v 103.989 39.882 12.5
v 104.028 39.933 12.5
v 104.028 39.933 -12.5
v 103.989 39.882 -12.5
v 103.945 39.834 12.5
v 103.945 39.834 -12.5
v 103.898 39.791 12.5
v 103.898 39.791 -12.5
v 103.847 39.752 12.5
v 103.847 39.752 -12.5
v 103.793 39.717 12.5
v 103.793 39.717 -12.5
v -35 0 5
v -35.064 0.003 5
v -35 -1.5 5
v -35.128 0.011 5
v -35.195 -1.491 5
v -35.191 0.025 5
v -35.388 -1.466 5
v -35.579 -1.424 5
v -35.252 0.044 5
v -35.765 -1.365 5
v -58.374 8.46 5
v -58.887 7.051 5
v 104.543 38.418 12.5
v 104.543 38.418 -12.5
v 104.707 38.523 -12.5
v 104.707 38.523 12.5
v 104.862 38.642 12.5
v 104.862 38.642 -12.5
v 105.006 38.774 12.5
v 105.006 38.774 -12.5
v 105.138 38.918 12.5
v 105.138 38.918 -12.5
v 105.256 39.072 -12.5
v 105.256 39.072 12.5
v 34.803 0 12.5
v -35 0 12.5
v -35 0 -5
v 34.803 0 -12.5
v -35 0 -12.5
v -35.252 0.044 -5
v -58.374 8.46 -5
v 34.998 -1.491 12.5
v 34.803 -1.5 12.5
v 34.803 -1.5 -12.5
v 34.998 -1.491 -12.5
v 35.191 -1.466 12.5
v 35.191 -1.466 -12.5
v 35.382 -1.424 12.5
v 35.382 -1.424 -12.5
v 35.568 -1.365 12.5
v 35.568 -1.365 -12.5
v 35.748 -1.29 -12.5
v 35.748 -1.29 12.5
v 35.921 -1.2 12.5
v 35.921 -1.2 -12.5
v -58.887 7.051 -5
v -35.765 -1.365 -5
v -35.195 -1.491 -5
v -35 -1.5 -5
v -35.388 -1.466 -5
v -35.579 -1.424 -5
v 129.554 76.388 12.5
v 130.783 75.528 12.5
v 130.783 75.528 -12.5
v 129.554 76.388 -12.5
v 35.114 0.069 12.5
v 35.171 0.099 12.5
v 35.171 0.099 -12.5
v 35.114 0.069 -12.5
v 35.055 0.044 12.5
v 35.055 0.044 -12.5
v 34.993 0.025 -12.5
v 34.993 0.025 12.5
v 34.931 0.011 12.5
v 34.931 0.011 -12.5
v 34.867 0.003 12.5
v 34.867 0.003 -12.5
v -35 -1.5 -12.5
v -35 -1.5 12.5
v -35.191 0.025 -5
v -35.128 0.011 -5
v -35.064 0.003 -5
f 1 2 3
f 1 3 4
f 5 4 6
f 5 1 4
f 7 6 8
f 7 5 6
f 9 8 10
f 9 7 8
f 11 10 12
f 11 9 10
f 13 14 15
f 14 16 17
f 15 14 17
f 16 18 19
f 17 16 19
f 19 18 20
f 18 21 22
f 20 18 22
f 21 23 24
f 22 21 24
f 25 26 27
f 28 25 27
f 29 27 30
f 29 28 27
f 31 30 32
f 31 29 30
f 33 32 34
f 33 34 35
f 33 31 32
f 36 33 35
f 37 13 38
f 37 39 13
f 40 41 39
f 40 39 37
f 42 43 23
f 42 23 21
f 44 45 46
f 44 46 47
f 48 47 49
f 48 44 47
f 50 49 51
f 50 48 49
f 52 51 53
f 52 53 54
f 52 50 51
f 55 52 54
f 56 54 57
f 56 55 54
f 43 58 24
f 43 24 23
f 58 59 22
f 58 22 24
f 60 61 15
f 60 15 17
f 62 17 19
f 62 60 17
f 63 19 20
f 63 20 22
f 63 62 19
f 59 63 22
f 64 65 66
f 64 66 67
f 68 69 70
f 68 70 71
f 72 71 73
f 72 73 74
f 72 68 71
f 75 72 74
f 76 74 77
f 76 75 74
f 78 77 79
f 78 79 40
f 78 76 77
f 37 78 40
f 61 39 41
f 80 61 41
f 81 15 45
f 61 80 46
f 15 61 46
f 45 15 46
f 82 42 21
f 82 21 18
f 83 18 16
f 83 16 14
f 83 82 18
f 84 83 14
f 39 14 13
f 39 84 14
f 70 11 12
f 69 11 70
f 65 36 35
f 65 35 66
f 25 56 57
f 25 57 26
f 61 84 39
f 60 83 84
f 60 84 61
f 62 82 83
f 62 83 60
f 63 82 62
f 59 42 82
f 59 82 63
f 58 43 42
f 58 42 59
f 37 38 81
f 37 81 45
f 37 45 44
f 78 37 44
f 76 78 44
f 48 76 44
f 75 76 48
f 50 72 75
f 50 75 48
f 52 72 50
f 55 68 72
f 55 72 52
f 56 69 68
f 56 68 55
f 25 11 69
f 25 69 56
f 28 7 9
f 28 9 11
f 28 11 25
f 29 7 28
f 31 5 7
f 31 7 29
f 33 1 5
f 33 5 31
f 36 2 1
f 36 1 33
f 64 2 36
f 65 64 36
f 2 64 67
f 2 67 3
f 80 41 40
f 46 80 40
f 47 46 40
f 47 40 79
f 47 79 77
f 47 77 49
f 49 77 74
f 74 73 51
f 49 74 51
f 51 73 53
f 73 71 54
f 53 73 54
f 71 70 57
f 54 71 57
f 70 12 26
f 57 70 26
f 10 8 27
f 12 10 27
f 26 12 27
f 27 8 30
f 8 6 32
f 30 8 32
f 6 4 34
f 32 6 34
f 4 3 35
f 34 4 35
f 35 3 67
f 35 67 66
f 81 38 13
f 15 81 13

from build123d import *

# Parameters (mm, degrees)
SKETCH1_W                    = 70
SKETCH1_H                    = 25
BASE_FLANGE1_DEPTH           = 1.5
EDGE_FLANGE1_DEPTH           = 10
EDGE_FLANGE2_STRIP_CUT_DEPTH = 25
EDGE_FLANGE2_DEPTH           = 25
EDGE_FLANGE3_STRIP_CUT_DEPTH = 25
EDGE_FLANGE3_DEPTH           = 25


# Sheet-metal steps are written as plain solids
with BuildPart() as part:
    # Sketch1 → Base-Flange1 (new body)
    with BuildSketch(Plane(origin=(0, 0, 0), x_dir=(1, 0, 0), z_dir=(0, 1, 0))):
        Rectangle(SKETCH1_W, SKETCH1_H)
    extrude(amount=-BASE_FLANGE1_DEPTH)

    # Edge-Flange1 section (across the edge) → Edge-Flange1 (add)
    with BuildSketch(Plane(origin=(-35.129882454, 0, -5), x_dir=(0.3420201433256639, 0.9396926207859102, 0), z_dir=(0, 0, 1))):
        with BuildLine():
            Line((-1.5, 0.129882454), (-1.5, 24.735509529))
            Line((-1.5, 24.735509529), (0, 24.735509529))
            Line((0, 24.735509529), (0, 0.129882454))
            ThreePointArc((0, 0.129882454), (0.011190609, 0.001973206), (0.044422416, -0.122049584))
            Line((0.044422416, -0.122049584), (-1.365116516, -0.635079799))
            ThreePointArc((-1.365116516, -0.635079799), (-1.46602102, -0.25849906), (-1.5, 0.129882454))
        make_face()
    extrude(amount=EDGE_FLANGE1_DEPTH)

    # Edge-Flange2 strip (across the edge) → Edge-Flange2 strip cut (cut)
    with BuildSketch(Plane(origin=(35, 0, 12.5), x_dir=(-0.49999999999999495, 0.8660254037844416, 0), z_dir=(0, 0, -1))):
        Polygon((-4.936952418, 5.551052423), (-1.200352418, -0.920928625), (0.098685688, -0.170928625), (-3.637914312, 6.301052423), align=None)
    extrude(amount=EDGE_FLANGE2_STRIP_CUT_DEPTH, mode=Mode.SUBTRACT)

    # Edge-Flange2 section (across the edge) → Edge-Flange2 (add)
    with BuildSketch(Plane(origin=(35, 0, 12.5), x_dir=(-0.49999999999999495, 0.8660254037844416, 0), z_dir=(0, 0, -1))):
        with BuildLine():
            Line((-1.5, 0.197371375), (-1.5, 79.598076211))
            Line((-1.5, 79.598076211), (0, 79.598076211))
            Line((0, 79.598076211), (0, 0.197371375))
            ThreePointArc((0, 0.197371375), (0.025099036, 0.006725267), (0.098685688, -0.170928625))
            Line((0.098685688, -0.170928625), (-1.200352418, -0.920928625))
            ThreePointArc((-1.200352418, -0.920928625), (-1.423789703, -0.381503301), (-1.5, 0.197371375))
        make_face()
    extrude(amount=EDGE_FLANGE2_DEPTH)

    # Edge-Flange3 strip (across the edge) → Edge-Flange3 strip cut (cut)
    with BuildSketch(Plane(origin=(103.933956091, 39.799038106, 12.5), x_dir=(-0.8191520442889849, 0.573576436351056, 0), z_dir=(0, 0, -1))):
        Polygon((-4.44875879, 5.991091638), (-1.290447996, -0.781927716), (0.069013684, -0.148000323), (-3.08929711, 6.625019031), align=None)
    extrude(amount=EDGE_FLANGE3_STRIP_CUT_DEPTH, mode=Mode.SUBTRACT)

    # Edge-Flange3 section (across the edge) → Edge-Flange3 (add)
    with BuildSketch(Plane(origin=(103.933956091, 39.799038106, 12.5), x_dir=(-0.8191520442889849, 0.573576436351056, 0), z_dir=(0, 0, -1))):
        with BuildLine():
            Line((-1.5, 0.163300289), (-1.5, 44.667458006))
            Line((-1.5, 44.667458006), (0, 44.667458006))
            Line((0, 44.667458006), (0, 0.163300289))
            ThreePointArc((0, 0.163300289), (0.017460361, 0.003870869), (0.069013684, -0.148000323))
            Line((0.069013684, -0.148000323), (-1.290447996, -0.781927716))
            ThreePointArc((-1.290447996, -0.781927716), (-1.44698365, -0.320788552), (-1.5, 0.163300289))
        make_face()
    extrude(amount=EDGE_FLANGE3_DEPTH)


solid = part.part
